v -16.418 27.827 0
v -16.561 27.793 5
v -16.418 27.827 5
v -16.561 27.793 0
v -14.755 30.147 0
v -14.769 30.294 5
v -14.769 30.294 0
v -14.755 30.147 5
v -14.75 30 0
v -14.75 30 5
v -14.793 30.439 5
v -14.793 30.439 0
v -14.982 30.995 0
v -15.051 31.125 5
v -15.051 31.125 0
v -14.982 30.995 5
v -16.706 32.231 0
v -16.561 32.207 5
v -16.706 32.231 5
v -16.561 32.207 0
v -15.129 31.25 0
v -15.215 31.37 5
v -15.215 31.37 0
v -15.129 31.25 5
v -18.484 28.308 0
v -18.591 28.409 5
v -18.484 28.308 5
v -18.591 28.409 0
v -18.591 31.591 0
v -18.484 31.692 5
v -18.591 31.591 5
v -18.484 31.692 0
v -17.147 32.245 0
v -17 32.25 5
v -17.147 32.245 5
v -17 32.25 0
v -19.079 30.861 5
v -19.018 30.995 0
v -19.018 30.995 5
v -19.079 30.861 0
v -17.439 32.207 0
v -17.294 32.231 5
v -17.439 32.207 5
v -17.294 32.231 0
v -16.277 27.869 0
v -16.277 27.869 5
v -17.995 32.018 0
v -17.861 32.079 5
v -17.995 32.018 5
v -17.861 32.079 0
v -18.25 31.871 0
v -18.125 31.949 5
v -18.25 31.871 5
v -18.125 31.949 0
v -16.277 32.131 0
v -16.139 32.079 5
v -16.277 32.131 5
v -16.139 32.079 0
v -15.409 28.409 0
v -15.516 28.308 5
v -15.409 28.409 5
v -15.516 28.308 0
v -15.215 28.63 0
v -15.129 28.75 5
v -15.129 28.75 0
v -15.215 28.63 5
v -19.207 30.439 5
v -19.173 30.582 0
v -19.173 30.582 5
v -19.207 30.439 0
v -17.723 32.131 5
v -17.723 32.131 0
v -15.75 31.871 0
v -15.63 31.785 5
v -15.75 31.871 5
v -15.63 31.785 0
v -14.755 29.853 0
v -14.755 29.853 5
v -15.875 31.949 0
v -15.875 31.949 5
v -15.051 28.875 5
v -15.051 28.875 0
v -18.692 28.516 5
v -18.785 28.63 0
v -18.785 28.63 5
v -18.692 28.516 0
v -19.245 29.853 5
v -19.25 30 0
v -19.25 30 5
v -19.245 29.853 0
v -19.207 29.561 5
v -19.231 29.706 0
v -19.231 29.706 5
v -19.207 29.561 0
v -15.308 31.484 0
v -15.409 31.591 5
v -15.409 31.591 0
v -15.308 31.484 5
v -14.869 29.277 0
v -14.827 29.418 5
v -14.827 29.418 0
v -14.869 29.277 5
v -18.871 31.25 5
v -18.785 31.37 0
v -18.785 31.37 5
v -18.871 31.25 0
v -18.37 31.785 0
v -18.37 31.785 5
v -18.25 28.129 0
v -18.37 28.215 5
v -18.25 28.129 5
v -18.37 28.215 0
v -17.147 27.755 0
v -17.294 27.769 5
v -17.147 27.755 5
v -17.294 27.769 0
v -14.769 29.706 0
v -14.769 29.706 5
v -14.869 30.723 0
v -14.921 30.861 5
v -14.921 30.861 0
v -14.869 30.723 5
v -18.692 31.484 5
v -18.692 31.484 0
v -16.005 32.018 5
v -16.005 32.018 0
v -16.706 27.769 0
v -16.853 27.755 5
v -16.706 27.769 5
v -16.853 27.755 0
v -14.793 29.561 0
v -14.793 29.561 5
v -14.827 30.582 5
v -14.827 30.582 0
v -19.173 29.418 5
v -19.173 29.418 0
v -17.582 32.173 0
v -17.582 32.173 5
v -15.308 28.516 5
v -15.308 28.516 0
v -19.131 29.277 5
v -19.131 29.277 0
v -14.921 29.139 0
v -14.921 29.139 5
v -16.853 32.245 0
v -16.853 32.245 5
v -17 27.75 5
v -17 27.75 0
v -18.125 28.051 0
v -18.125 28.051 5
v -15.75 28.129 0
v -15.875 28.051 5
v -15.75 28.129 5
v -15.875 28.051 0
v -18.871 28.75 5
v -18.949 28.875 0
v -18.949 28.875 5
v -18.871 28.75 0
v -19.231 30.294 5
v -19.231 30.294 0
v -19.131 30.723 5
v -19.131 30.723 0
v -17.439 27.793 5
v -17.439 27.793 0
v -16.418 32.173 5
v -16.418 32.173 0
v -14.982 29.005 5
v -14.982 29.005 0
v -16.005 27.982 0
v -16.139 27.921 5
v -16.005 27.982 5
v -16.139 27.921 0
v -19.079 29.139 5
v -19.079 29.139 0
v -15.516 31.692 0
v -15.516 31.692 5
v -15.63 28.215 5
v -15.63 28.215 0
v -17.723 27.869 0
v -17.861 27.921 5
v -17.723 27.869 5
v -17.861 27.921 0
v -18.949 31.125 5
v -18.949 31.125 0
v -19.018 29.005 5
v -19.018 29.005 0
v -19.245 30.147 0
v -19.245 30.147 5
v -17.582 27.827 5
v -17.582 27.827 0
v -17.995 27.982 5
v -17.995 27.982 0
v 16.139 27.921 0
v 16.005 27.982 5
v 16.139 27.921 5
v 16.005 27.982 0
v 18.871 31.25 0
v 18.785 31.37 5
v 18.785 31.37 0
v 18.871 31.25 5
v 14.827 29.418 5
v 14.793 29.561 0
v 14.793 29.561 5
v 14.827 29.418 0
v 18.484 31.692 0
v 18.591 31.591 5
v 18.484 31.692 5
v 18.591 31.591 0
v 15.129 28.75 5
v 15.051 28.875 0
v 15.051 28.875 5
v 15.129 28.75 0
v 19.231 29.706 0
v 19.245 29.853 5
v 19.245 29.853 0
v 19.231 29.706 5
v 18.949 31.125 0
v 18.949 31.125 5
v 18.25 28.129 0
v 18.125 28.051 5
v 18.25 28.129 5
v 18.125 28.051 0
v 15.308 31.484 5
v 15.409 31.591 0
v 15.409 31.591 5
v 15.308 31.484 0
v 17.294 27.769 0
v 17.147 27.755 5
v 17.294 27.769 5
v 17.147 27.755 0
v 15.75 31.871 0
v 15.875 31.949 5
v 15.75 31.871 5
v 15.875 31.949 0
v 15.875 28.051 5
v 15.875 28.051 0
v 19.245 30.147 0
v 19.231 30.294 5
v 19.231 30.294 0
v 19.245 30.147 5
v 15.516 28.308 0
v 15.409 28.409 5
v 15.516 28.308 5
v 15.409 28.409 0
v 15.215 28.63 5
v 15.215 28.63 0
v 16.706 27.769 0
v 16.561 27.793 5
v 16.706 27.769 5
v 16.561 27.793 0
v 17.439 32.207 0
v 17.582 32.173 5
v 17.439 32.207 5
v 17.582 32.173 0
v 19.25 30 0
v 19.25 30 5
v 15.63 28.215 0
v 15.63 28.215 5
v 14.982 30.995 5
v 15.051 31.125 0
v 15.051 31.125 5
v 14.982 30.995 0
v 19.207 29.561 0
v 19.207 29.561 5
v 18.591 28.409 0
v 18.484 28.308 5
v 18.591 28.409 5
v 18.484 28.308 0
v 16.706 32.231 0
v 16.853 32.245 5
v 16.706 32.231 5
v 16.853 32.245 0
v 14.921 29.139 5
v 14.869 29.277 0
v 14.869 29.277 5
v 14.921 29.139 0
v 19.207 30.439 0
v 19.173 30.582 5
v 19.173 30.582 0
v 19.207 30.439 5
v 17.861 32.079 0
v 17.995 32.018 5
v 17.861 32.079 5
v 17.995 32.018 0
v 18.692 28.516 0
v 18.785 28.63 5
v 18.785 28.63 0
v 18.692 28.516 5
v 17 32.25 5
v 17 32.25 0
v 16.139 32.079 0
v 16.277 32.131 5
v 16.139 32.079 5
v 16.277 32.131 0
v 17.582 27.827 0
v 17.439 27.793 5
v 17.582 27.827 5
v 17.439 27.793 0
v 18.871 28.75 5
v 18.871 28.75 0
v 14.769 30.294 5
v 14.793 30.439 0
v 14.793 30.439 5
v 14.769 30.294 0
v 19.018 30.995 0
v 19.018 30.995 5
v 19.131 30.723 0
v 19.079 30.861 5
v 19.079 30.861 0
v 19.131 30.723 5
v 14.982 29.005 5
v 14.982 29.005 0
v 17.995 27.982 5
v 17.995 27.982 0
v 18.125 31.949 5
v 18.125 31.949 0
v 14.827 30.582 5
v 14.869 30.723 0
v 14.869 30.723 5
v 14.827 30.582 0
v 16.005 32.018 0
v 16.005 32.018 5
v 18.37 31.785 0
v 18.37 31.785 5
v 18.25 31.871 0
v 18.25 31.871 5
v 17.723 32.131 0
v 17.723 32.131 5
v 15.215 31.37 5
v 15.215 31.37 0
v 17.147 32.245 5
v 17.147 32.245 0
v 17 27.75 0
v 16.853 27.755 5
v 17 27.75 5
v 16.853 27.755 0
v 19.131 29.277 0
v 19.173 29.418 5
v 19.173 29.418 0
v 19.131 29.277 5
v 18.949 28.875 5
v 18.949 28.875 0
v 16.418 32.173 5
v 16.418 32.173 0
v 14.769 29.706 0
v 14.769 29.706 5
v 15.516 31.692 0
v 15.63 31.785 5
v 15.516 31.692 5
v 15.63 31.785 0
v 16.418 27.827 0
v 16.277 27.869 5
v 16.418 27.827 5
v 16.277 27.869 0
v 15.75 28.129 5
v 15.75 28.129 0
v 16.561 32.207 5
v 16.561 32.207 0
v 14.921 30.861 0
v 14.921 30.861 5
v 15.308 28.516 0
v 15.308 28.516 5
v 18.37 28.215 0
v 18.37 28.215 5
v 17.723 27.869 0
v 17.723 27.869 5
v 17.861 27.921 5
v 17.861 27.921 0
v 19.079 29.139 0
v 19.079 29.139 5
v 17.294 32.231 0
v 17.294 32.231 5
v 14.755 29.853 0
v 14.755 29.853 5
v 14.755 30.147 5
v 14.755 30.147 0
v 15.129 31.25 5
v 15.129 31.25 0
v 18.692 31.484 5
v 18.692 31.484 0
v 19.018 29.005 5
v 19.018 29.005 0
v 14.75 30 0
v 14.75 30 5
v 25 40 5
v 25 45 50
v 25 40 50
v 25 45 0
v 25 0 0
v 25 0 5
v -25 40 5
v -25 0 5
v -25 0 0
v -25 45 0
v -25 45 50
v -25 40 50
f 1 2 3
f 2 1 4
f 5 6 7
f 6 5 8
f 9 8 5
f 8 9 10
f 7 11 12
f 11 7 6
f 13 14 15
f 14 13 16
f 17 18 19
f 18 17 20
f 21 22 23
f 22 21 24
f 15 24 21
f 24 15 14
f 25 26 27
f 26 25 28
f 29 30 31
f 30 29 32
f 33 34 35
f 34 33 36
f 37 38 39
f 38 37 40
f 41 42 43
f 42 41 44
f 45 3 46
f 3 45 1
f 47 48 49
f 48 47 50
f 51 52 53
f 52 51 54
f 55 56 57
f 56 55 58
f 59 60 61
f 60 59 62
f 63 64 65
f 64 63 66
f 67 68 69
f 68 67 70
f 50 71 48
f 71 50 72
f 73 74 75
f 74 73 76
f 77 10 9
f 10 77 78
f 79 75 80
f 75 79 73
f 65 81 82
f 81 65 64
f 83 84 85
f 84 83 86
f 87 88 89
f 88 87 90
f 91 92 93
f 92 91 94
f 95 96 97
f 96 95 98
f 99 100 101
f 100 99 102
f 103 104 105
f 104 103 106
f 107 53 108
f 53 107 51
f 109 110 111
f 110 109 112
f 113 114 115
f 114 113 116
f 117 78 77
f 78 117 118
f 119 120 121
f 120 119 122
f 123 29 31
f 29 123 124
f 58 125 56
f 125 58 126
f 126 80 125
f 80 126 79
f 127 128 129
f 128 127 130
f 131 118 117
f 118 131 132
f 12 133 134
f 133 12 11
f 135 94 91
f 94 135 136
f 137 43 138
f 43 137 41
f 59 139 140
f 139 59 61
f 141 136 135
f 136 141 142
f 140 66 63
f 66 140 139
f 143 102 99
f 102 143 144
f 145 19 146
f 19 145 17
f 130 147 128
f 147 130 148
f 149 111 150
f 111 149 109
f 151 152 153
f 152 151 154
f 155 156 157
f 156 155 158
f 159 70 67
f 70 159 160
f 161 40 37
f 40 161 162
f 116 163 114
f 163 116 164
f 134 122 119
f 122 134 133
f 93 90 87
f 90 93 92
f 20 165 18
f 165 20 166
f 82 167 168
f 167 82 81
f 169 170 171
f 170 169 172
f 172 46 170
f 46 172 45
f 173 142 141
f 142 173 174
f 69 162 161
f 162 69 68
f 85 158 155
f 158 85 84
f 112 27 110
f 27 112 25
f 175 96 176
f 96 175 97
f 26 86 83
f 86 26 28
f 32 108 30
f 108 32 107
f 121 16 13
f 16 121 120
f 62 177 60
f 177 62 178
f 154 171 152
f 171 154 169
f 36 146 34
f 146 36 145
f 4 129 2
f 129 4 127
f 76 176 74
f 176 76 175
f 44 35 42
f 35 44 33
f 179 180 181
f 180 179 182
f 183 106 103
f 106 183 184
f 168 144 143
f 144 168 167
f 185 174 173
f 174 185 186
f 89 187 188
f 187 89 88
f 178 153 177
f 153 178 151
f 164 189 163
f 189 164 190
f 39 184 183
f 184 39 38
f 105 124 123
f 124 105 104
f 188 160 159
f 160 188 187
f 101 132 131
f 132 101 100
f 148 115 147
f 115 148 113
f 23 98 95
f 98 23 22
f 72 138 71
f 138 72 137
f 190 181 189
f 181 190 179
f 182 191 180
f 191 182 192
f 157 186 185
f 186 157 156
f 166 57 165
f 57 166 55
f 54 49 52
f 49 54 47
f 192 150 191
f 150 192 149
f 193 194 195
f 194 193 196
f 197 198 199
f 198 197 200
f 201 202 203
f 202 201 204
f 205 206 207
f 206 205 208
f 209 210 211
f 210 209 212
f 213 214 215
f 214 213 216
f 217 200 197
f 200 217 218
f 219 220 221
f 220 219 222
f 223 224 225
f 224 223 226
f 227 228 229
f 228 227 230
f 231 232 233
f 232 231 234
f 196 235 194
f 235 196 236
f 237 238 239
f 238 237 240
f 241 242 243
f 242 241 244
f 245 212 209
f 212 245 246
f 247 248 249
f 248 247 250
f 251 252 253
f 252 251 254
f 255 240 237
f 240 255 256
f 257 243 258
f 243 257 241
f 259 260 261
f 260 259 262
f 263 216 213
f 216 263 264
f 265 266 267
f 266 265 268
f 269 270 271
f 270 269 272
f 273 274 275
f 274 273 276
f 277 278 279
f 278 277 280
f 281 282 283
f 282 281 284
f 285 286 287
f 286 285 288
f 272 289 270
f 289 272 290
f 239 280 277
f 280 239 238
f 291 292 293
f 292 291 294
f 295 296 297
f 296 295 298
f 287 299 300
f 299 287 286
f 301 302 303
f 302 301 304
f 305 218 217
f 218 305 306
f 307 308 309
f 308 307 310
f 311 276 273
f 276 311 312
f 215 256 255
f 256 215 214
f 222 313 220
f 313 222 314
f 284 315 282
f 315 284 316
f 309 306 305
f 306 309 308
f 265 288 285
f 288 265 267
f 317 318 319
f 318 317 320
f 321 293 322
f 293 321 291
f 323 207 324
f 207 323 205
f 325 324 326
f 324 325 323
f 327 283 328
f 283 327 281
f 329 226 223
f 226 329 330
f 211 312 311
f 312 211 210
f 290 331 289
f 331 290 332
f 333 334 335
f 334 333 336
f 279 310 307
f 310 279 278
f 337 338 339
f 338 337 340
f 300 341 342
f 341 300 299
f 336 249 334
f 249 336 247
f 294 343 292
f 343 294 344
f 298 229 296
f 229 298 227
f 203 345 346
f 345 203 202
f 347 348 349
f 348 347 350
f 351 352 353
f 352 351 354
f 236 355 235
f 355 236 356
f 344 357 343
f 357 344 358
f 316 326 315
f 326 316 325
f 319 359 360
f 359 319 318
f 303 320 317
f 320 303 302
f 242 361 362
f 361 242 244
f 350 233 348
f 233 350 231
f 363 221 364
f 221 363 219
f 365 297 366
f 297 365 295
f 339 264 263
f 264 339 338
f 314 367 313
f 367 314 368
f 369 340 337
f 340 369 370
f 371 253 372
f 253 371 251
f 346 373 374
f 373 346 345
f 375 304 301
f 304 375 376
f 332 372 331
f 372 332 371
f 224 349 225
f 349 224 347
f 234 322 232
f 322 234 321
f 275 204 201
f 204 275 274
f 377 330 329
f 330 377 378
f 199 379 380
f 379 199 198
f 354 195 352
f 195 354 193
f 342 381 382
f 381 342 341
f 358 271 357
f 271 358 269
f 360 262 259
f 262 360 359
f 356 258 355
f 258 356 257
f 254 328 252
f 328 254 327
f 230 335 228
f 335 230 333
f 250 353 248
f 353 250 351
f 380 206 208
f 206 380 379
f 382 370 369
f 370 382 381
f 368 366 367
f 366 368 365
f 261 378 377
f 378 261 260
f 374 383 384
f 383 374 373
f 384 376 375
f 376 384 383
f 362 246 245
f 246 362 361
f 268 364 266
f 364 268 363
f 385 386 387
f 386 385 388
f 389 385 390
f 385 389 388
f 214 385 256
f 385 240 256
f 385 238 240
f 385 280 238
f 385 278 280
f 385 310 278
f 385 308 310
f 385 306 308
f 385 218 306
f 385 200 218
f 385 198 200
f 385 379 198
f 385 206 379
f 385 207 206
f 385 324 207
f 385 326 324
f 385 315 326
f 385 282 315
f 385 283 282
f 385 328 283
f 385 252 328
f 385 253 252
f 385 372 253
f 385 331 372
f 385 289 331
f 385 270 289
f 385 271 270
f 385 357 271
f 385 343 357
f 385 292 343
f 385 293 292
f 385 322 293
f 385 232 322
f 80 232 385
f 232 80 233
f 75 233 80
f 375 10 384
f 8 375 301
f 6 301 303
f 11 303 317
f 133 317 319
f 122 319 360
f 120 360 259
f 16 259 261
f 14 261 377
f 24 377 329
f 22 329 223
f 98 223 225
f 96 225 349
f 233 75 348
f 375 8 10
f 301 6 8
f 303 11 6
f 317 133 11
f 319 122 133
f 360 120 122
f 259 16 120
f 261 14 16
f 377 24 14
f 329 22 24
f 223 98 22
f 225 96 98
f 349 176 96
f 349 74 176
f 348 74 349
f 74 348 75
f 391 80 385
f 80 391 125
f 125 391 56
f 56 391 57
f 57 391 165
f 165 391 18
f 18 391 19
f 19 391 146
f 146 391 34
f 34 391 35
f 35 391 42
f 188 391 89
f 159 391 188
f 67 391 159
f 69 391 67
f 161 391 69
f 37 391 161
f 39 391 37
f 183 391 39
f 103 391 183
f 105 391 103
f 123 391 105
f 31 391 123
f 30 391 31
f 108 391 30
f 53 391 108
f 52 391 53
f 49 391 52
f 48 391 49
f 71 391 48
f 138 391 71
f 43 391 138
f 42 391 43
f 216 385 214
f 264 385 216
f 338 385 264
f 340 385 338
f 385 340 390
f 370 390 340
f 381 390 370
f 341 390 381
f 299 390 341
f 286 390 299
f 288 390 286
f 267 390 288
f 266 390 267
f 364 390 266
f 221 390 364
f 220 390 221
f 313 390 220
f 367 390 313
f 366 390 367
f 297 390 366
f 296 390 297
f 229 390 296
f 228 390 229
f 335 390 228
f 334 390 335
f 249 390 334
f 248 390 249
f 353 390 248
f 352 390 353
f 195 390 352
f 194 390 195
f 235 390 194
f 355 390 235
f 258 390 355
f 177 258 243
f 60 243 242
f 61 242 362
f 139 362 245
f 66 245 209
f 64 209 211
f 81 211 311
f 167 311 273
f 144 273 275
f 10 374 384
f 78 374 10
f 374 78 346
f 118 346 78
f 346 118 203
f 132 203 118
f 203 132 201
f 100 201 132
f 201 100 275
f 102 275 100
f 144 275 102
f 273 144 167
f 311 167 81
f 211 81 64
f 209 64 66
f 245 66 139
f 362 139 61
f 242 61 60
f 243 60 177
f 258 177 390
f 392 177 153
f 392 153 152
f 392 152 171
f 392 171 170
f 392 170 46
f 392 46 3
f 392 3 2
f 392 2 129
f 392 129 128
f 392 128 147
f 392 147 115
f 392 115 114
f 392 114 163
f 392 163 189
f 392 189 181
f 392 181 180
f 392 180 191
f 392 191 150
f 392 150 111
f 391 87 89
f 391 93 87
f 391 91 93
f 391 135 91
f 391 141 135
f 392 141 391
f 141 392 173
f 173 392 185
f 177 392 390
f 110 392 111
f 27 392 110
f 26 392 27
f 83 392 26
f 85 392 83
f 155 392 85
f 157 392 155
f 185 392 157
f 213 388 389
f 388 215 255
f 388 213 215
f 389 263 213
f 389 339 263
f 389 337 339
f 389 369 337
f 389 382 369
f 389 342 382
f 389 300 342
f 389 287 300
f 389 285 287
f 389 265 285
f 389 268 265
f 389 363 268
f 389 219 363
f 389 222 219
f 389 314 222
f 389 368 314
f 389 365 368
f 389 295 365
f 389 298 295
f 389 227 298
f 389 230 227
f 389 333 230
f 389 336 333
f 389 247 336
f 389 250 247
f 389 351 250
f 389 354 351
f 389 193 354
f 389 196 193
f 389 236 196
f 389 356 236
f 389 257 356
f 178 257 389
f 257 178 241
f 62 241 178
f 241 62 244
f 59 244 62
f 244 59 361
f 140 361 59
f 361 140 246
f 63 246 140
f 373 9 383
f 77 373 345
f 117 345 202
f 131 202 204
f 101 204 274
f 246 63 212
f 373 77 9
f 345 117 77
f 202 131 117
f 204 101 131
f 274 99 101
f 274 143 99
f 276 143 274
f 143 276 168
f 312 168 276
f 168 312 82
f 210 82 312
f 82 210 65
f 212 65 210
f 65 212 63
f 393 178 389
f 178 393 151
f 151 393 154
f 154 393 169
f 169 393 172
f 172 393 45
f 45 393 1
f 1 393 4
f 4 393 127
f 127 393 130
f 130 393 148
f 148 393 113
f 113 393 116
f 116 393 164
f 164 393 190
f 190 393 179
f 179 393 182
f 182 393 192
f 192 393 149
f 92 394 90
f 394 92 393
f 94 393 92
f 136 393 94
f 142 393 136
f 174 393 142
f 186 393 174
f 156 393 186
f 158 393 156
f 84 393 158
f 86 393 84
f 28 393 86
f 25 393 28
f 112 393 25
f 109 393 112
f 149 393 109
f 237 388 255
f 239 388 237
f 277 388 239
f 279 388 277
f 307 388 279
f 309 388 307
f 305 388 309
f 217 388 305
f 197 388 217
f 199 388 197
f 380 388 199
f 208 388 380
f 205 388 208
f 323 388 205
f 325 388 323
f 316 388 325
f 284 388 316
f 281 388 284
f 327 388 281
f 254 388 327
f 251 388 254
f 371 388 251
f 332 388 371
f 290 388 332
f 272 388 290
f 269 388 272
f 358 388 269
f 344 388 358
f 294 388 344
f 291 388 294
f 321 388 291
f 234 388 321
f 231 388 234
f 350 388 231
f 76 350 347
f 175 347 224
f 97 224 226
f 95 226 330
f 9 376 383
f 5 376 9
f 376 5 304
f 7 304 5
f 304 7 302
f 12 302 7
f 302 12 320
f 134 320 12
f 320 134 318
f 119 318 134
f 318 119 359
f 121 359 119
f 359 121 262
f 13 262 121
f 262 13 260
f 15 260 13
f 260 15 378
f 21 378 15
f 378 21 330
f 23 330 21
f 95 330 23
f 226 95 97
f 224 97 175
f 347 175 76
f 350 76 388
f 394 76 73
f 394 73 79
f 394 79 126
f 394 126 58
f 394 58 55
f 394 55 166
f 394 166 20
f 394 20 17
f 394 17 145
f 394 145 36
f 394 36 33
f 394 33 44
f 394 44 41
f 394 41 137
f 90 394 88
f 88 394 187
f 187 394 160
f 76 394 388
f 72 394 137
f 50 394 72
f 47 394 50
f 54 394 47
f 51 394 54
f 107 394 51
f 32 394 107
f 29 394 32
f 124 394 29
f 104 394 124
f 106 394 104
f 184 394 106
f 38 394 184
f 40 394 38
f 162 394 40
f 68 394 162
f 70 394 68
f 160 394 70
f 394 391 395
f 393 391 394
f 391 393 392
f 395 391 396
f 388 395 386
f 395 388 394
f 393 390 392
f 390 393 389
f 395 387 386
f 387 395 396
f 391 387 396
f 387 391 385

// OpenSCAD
// L-shaped mounting bracket for a NEMA 17 stepper motor (e.g. syringe pump)
// Print orientation: base plate on the bed, vertical plate builds upward (+Z)

// ---------------- Parameters ----------------
plate_x       = 50;    // base plate length (x: -25 .. 25)
plate_y       = 45;    // base plate width (y: 0 .. 45)
plate_t       = 5;     // base plate thickness (z: 0 .. 5)

motor_h       = 50;    // vertical motor plate height (z: 0 .. 50)
hole_d        = 23;    // motor centring boss hole diameter
hole_x        = 0;     // boss hole centre X
hole_z        = 28;    // boss hole centre Z
screw_d       = 3.4;   // M3 screw hole diameter
screw_pitch   = 31;    // distance between opposite M3 screw holes (square)

gusset_t      = 5;     // gusset thickness (X)
gusset_leg    = 20;    // right-triangle leg length (Y and Z)

eps           = 0.5;   // cutter overshoot past faces

$fn = 96;

// ---------------- Model ----------------
union() {
    // Base plate with two M4 through-holes at (x = -17, y = 30) and (x = 17, y = 30)
    difference() {
        translate([-plate_x/2, 0, 0])
            cube([plate_x, plate_y, plate_t]);

        for (sx = [-17, 17])
            translate([sx, 30, -eps])
                cylinder(d = 4.5, h = plate_t + 2*eps);
    }

    // Vertical motor plate, standing on the back edge of the base (y = 0)
    difference() {
        translate([-plate_x/2, plate_y - gusset_t, 0])   // x: -25 .. 25, y: 5 .. 40
            cube([plate_x, gusset_t, motor_h]);

        // Motor centring boss hole, along Y
        translate([hole_x, -eps, hole_z])
            rotate([-90, 0, 0])
                cylinder(d = hole_d, h = gusset_t + 2*eps);

        // Four M3 screw holes on a 31 mm square pattern, centred on the boss hole
        for (a = [0, 90, 180, 270])
            rotate([0, 0, a])
                translate([0, 0, hole_z])
                    cylinder(d = screw_d, h = gusset_t + 2*eps);
    }

    // Two triangular gussets, flush with the left and right edges:
    // right triangle in the YZ plane with legs 20 mm along +Y and 20 mm along +Z,
    // right-angle corner at (y = 5, z = 5), thickness 5 mm in X.
    for (sx = [-1, 1])
        translate([sx * (plate_x/2 - gusset_t), 0, 0])
            hull() {
                translate([0, gusset_t, 0])
                    cube([gusset_t, gusset_t, 0]);          // leg along +Y
                translate([0, 0, gusset_t])
                    cube([0, gusset_t, gusset_t]);          // leg along +Z
            }
}
